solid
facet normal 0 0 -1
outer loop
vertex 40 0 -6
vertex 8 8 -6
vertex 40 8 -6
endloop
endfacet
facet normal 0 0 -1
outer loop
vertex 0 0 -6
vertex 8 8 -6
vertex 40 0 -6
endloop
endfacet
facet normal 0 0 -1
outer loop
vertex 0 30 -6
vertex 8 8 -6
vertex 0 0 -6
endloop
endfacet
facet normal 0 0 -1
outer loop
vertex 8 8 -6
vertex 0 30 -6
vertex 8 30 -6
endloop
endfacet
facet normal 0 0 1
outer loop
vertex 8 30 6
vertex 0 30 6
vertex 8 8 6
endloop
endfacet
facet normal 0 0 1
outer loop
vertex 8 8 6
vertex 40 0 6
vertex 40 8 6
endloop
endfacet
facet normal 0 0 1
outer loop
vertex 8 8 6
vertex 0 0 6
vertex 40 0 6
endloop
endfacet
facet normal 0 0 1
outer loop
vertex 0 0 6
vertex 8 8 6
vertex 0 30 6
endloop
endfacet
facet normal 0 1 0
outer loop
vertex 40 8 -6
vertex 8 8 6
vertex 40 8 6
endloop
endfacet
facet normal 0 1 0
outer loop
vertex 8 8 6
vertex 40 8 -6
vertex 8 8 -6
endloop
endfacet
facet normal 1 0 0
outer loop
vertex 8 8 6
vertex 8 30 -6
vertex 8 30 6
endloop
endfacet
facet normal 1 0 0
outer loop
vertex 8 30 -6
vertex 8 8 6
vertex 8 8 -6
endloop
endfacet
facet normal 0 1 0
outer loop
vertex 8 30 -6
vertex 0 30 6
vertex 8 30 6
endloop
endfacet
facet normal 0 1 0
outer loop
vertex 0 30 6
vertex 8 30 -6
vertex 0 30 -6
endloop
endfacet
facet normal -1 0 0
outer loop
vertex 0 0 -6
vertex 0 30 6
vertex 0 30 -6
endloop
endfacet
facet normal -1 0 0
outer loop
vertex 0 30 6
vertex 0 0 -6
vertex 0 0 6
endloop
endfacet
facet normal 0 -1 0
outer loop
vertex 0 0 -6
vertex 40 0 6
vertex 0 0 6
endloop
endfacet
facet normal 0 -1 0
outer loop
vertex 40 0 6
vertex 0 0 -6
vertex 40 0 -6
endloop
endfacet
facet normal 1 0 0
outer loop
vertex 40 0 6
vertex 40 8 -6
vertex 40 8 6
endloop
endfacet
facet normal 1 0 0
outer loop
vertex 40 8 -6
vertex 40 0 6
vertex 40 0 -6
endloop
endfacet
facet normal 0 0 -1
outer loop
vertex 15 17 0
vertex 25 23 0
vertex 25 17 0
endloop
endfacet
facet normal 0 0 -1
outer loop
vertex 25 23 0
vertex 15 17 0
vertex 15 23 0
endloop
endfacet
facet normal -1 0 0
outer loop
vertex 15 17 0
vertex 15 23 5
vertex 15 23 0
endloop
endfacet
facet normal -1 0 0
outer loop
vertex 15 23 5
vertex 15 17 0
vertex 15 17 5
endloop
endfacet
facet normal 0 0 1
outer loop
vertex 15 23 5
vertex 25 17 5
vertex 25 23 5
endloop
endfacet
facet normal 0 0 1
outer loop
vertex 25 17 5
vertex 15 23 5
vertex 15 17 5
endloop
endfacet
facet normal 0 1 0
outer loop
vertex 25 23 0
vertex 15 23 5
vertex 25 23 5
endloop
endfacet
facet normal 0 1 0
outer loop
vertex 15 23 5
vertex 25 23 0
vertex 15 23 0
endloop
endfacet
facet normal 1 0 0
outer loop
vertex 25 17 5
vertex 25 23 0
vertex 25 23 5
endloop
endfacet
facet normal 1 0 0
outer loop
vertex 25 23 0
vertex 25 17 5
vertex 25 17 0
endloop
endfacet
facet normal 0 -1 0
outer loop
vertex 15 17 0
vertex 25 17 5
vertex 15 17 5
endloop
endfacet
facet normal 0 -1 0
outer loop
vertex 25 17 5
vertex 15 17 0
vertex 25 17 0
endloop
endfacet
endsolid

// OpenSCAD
// extruded L profile
$fn = 32;
linear_extrude(height = 12, center = true)
  polygon(points = [[0,0], [40,0], [40,8], [8,8], [8,30], [0,30]]);
translate([20, 20, 0]) linear_extrude(height = 5) square([10, 6], center = true);
